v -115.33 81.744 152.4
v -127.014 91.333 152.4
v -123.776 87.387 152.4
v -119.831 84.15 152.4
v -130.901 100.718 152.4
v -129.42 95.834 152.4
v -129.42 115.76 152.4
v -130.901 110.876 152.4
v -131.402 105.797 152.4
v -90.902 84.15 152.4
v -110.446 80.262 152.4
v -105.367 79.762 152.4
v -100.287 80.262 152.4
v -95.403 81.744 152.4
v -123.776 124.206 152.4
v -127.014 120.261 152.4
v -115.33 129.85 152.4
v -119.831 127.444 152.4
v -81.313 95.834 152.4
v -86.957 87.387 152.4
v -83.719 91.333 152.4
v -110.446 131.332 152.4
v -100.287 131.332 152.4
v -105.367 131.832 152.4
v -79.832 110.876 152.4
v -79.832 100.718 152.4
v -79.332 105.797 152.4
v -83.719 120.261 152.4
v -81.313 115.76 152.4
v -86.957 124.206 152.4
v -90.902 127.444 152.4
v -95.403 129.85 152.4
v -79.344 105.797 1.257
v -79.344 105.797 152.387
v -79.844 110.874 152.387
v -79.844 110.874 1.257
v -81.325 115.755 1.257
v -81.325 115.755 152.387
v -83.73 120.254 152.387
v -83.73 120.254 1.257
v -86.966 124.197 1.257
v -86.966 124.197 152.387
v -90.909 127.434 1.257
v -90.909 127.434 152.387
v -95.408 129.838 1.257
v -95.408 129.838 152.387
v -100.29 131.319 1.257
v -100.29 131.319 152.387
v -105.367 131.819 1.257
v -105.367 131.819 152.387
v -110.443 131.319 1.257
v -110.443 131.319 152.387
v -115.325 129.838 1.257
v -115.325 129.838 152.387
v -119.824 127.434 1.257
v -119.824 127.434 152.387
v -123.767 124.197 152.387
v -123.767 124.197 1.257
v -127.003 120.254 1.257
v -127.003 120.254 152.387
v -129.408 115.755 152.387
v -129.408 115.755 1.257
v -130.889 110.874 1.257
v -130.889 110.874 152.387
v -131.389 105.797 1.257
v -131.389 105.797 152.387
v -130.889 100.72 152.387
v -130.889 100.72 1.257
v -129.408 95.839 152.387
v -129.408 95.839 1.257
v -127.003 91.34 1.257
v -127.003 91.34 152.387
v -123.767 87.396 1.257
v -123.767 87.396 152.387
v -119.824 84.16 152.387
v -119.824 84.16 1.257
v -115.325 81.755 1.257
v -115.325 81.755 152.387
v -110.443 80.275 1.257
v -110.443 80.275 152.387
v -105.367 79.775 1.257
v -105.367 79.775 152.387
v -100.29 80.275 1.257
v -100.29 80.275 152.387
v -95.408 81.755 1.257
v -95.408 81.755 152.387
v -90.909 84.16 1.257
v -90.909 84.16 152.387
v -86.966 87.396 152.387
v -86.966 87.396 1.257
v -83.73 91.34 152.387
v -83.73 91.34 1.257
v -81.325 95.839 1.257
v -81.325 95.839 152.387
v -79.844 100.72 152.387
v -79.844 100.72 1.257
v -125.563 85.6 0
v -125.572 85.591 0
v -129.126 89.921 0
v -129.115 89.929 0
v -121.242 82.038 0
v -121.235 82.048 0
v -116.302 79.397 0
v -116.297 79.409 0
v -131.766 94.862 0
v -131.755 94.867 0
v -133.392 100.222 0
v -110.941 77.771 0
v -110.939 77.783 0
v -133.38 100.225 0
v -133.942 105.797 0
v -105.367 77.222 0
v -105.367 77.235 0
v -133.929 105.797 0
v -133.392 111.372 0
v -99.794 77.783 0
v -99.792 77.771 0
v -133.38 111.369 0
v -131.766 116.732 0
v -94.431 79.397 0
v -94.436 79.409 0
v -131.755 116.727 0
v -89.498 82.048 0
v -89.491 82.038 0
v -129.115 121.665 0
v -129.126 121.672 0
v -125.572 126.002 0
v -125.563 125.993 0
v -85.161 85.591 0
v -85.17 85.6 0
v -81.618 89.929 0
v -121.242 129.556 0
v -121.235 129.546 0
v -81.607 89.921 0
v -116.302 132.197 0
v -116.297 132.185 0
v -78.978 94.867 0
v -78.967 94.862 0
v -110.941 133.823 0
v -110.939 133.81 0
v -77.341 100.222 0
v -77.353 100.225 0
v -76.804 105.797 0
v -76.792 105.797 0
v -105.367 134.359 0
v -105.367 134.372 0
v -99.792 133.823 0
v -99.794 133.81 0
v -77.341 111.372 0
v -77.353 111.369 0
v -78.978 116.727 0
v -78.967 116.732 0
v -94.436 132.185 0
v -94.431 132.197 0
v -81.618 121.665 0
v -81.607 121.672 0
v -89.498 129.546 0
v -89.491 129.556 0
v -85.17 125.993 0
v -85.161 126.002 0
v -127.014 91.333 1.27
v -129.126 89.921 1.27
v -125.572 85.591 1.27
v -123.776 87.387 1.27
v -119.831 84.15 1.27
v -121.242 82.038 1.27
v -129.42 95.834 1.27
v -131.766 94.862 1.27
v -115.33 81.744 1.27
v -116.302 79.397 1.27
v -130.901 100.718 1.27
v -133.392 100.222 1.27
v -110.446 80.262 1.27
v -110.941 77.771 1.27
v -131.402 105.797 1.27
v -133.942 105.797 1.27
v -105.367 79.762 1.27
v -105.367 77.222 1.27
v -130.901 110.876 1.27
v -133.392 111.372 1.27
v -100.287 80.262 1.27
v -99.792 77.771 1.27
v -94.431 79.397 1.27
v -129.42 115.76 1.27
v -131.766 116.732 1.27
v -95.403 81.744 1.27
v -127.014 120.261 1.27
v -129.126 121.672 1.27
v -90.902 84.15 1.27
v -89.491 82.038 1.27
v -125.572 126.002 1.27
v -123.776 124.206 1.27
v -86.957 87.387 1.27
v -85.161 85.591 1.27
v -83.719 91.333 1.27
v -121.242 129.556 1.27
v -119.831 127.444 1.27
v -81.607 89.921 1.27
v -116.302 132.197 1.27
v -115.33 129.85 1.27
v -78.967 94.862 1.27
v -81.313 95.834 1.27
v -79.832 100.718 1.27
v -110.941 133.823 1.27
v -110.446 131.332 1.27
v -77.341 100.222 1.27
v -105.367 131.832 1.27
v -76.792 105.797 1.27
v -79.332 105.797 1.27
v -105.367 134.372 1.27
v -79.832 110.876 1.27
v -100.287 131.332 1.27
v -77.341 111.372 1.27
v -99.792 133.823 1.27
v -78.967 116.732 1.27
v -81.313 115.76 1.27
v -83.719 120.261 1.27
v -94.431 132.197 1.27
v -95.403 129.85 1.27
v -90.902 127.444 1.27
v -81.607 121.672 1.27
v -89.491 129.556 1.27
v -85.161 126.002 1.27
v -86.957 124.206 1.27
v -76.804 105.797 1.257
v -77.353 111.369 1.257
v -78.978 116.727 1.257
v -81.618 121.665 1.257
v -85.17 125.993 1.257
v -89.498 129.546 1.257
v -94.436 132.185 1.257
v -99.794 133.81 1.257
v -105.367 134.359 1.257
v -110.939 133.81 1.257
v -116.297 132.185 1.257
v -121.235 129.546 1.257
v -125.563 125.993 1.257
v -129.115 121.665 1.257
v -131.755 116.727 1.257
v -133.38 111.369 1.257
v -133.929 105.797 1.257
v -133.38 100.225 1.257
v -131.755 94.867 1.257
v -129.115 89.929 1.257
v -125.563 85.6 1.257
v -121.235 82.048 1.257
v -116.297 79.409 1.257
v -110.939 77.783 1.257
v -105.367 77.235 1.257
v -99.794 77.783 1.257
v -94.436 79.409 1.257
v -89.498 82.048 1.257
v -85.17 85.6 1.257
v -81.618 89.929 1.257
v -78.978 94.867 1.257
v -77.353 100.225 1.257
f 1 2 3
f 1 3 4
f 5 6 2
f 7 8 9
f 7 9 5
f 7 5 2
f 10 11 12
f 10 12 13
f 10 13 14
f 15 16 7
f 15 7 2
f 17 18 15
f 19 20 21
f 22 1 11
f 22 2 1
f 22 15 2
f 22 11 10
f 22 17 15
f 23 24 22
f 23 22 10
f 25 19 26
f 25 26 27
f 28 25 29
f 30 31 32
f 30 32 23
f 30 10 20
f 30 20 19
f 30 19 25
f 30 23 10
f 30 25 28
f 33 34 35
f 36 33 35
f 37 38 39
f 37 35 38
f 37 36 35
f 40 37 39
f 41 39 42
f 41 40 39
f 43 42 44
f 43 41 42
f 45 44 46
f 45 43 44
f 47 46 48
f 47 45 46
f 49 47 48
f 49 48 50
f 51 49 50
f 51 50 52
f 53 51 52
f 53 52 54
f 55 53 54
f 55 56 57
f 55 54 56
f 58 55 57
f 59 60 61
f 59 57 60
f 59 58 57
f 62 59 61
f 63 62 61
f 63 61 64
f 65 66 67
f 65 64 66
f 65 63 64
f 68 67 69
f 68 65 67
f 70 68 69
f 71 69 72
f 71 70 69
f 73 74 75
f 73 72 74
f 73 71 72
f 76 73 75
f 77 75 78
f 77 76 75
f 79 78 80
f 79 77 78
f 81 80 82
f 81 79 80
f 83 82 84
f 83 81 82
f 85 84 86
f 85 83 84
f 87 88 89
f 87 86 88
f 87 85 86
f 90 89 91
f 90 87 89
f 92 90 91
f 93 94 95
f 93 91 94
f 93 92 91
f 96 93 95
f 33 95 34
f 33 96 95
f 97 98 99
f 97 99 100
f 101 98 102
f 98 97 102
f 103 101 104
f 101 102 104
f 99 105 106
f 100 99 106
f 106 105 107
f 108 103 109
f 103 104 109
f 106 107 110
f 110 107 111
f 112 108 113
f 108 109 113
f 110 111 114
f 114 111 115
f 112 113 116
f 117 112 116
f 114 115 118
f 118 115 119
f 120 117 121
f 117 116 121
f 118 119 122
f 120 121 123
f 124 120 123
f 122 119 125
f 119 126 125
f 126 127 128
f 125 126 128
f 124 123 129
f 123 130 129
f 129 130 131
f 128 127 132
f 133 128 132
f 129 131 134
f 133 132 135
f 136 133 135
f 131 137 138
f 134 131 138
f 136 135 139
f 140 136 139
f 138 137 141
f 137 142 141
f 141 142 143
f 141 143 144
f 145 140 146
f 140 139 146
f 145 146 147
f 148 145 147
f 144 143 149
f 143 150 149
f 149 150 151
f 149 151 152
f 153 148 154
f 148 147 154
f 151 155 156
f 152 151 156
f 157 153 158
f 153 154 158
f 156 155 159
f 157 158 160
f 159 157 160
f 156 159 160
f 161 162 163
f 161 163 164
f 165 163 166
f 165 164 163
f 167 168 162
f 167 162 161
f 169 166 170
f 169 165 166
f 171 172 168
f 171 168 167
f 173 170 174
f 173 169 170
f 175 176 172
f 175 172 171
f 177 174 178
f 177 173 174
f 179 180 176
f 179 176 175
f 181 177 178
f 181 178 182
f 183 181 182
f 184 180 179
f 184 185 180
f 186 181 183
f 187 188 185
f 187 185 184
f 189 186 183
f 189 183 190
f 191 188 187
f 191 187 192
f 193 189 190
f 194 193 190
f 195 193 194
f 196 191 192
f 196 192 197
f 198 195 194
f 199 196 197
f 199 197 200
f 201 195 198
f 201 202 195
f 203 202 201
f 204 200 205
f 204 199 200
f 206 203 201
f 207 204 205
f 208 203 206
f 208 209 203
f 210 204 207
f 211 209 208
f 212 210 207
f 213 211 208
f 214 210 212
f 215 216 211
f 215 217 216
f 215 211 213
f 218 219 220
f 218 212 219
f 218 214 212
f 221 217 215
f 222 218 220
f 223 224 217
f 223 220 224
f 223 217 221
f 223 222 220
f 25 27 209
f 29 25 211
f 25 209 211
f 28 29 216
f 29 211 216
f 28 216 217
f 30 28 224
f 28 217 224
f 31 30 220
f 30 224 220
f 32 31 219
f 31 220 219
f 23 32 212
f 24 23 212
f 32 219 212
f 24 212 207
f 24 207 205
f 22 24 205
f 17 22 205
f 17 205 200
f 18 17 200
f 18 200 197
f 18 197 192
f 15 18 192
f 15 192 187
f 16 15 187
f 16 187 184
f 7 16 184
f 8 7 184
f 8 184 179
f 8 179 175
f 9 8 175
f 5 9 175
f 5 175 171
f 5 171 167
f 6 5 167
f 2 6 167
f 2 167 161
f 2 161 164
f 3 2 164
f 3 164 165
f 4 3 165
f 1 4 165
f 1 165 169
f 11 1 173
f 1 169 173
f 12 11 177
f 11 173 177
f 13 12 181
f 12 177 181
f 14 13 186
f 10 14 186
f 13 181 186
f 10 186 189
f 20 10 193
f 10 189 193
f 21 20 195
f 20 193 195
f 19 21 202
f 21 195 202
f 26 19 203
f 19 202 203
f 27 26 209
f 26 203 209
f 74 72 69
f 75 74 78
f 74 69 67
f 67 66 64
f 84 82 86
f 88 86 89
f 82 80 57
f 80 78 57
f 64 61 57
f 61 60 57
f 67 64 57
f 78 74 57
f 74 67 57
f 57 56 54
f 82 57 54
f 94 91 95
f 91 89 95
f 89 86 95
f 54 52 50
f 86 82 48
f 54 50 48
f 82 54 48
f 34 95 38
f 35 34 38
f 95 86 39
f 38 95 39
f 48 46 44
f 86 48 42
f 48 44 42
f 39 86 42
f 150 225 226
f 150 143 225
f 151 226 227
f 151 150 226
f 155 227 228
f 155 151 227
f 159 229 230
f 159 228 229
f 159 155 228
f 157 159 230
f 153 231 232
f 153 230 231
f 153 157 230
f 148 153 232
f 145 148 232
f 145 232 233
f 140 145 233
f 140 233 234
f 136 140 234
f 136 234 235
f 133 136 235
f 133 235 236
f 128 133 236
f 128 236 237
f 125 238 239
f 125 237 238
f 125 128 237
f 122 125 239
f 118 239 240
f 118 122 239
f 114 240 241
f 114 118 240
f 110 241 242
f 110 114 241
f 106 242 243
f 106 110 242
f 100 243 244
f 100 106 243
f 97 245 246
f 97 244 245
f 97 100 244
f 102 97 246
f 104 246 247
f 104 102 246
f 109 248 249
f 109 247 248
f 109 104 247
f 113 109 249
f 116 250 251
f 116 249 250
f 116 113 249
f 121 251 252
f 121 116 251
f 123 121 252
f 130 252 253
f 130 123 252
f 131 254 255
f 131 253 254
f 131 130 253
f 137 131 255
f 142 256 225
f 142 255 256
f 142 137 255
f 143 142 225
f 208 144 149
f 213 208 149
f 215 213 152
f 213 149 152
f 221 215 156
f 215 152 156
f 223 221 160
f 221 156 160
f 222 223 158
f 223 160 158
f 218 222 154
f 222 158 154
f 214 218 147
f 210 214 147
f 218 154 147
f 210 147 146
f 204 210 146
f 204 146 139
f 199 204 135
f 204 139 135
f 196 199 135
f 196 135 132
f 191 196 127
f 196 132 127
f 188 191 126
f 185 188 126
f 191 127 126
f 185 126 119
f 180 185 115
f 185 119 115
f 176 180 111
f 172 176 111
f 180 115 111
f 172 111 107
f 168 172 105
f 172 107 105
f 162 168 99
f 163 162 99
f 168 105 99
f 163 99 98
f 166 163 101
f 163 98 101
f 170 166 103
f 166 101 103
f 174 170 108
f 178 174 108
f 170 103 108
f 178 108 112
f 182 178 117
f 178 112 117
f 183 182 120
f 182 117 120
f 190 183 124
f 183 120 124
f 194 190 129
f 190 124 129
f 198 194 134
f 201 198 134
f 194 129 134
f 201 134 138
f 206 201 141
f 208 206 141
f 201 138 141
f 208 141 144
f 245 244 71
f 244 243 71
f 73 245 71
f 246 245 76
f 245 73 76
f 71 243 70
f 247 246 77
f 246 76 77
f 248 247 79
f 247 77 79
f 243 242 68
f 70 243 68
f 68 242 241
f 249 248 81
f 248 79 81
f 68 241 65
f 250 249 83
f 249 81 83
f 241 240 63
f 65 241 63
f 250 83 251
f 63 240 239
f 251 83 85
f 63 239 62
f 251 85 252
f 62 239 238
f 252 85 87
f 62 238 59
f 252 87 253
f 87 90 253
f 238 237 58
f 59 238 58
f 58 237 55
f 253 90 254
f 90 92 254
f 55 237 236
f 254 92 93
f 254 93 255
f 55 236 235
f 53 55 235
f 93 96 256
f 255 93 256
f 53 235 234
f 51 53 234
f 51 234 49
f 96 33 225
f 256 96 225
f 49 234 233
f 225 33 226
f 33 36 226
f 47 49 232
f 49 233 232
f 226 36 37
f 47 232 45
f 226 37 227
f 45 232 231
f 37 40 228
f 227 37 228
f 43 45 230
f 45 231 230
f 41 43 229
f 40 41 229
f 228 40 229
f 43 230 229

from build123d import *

# Parameters (mm, degrees)
F0_R     = 26.035
F1_DEPTH = 152.4
F0_R_2   = 28.575
F2_DEPTH = 1.27
F3_T     = -0.0127


with BuildPart() as f1:
    # F0 (on Top) → F1 (new body)
    with BuildSketch(Plane.XY):
        with Locations((-105.3665056825, 105.7969033718)):
            Circle(F0_R)
    extrude(amount=F1_DEPTH)

    # F0 (on Top) → F2 (join)
    with BuildSketch(Plane.XY):
        with Locations((-105.3665056825, 105.7969033718)):
            Circle(F0_R_2)
        with Locations((-105.3665056825, 105.7969033718)):
            Circle(F0_R, mode=Mode.SUBTRACT)
    extrude(amount=F2_DEPTH)

    # F3
    f3_openings = [f1.faces().sort_by_distance(p)[0] for p in [
        (-105.366506, 105.796903, 0),
    ]]
    offset(amount=F3_T, openings=f3_openings, kind=Kind.INTERSECTION)


solid = f1.part
